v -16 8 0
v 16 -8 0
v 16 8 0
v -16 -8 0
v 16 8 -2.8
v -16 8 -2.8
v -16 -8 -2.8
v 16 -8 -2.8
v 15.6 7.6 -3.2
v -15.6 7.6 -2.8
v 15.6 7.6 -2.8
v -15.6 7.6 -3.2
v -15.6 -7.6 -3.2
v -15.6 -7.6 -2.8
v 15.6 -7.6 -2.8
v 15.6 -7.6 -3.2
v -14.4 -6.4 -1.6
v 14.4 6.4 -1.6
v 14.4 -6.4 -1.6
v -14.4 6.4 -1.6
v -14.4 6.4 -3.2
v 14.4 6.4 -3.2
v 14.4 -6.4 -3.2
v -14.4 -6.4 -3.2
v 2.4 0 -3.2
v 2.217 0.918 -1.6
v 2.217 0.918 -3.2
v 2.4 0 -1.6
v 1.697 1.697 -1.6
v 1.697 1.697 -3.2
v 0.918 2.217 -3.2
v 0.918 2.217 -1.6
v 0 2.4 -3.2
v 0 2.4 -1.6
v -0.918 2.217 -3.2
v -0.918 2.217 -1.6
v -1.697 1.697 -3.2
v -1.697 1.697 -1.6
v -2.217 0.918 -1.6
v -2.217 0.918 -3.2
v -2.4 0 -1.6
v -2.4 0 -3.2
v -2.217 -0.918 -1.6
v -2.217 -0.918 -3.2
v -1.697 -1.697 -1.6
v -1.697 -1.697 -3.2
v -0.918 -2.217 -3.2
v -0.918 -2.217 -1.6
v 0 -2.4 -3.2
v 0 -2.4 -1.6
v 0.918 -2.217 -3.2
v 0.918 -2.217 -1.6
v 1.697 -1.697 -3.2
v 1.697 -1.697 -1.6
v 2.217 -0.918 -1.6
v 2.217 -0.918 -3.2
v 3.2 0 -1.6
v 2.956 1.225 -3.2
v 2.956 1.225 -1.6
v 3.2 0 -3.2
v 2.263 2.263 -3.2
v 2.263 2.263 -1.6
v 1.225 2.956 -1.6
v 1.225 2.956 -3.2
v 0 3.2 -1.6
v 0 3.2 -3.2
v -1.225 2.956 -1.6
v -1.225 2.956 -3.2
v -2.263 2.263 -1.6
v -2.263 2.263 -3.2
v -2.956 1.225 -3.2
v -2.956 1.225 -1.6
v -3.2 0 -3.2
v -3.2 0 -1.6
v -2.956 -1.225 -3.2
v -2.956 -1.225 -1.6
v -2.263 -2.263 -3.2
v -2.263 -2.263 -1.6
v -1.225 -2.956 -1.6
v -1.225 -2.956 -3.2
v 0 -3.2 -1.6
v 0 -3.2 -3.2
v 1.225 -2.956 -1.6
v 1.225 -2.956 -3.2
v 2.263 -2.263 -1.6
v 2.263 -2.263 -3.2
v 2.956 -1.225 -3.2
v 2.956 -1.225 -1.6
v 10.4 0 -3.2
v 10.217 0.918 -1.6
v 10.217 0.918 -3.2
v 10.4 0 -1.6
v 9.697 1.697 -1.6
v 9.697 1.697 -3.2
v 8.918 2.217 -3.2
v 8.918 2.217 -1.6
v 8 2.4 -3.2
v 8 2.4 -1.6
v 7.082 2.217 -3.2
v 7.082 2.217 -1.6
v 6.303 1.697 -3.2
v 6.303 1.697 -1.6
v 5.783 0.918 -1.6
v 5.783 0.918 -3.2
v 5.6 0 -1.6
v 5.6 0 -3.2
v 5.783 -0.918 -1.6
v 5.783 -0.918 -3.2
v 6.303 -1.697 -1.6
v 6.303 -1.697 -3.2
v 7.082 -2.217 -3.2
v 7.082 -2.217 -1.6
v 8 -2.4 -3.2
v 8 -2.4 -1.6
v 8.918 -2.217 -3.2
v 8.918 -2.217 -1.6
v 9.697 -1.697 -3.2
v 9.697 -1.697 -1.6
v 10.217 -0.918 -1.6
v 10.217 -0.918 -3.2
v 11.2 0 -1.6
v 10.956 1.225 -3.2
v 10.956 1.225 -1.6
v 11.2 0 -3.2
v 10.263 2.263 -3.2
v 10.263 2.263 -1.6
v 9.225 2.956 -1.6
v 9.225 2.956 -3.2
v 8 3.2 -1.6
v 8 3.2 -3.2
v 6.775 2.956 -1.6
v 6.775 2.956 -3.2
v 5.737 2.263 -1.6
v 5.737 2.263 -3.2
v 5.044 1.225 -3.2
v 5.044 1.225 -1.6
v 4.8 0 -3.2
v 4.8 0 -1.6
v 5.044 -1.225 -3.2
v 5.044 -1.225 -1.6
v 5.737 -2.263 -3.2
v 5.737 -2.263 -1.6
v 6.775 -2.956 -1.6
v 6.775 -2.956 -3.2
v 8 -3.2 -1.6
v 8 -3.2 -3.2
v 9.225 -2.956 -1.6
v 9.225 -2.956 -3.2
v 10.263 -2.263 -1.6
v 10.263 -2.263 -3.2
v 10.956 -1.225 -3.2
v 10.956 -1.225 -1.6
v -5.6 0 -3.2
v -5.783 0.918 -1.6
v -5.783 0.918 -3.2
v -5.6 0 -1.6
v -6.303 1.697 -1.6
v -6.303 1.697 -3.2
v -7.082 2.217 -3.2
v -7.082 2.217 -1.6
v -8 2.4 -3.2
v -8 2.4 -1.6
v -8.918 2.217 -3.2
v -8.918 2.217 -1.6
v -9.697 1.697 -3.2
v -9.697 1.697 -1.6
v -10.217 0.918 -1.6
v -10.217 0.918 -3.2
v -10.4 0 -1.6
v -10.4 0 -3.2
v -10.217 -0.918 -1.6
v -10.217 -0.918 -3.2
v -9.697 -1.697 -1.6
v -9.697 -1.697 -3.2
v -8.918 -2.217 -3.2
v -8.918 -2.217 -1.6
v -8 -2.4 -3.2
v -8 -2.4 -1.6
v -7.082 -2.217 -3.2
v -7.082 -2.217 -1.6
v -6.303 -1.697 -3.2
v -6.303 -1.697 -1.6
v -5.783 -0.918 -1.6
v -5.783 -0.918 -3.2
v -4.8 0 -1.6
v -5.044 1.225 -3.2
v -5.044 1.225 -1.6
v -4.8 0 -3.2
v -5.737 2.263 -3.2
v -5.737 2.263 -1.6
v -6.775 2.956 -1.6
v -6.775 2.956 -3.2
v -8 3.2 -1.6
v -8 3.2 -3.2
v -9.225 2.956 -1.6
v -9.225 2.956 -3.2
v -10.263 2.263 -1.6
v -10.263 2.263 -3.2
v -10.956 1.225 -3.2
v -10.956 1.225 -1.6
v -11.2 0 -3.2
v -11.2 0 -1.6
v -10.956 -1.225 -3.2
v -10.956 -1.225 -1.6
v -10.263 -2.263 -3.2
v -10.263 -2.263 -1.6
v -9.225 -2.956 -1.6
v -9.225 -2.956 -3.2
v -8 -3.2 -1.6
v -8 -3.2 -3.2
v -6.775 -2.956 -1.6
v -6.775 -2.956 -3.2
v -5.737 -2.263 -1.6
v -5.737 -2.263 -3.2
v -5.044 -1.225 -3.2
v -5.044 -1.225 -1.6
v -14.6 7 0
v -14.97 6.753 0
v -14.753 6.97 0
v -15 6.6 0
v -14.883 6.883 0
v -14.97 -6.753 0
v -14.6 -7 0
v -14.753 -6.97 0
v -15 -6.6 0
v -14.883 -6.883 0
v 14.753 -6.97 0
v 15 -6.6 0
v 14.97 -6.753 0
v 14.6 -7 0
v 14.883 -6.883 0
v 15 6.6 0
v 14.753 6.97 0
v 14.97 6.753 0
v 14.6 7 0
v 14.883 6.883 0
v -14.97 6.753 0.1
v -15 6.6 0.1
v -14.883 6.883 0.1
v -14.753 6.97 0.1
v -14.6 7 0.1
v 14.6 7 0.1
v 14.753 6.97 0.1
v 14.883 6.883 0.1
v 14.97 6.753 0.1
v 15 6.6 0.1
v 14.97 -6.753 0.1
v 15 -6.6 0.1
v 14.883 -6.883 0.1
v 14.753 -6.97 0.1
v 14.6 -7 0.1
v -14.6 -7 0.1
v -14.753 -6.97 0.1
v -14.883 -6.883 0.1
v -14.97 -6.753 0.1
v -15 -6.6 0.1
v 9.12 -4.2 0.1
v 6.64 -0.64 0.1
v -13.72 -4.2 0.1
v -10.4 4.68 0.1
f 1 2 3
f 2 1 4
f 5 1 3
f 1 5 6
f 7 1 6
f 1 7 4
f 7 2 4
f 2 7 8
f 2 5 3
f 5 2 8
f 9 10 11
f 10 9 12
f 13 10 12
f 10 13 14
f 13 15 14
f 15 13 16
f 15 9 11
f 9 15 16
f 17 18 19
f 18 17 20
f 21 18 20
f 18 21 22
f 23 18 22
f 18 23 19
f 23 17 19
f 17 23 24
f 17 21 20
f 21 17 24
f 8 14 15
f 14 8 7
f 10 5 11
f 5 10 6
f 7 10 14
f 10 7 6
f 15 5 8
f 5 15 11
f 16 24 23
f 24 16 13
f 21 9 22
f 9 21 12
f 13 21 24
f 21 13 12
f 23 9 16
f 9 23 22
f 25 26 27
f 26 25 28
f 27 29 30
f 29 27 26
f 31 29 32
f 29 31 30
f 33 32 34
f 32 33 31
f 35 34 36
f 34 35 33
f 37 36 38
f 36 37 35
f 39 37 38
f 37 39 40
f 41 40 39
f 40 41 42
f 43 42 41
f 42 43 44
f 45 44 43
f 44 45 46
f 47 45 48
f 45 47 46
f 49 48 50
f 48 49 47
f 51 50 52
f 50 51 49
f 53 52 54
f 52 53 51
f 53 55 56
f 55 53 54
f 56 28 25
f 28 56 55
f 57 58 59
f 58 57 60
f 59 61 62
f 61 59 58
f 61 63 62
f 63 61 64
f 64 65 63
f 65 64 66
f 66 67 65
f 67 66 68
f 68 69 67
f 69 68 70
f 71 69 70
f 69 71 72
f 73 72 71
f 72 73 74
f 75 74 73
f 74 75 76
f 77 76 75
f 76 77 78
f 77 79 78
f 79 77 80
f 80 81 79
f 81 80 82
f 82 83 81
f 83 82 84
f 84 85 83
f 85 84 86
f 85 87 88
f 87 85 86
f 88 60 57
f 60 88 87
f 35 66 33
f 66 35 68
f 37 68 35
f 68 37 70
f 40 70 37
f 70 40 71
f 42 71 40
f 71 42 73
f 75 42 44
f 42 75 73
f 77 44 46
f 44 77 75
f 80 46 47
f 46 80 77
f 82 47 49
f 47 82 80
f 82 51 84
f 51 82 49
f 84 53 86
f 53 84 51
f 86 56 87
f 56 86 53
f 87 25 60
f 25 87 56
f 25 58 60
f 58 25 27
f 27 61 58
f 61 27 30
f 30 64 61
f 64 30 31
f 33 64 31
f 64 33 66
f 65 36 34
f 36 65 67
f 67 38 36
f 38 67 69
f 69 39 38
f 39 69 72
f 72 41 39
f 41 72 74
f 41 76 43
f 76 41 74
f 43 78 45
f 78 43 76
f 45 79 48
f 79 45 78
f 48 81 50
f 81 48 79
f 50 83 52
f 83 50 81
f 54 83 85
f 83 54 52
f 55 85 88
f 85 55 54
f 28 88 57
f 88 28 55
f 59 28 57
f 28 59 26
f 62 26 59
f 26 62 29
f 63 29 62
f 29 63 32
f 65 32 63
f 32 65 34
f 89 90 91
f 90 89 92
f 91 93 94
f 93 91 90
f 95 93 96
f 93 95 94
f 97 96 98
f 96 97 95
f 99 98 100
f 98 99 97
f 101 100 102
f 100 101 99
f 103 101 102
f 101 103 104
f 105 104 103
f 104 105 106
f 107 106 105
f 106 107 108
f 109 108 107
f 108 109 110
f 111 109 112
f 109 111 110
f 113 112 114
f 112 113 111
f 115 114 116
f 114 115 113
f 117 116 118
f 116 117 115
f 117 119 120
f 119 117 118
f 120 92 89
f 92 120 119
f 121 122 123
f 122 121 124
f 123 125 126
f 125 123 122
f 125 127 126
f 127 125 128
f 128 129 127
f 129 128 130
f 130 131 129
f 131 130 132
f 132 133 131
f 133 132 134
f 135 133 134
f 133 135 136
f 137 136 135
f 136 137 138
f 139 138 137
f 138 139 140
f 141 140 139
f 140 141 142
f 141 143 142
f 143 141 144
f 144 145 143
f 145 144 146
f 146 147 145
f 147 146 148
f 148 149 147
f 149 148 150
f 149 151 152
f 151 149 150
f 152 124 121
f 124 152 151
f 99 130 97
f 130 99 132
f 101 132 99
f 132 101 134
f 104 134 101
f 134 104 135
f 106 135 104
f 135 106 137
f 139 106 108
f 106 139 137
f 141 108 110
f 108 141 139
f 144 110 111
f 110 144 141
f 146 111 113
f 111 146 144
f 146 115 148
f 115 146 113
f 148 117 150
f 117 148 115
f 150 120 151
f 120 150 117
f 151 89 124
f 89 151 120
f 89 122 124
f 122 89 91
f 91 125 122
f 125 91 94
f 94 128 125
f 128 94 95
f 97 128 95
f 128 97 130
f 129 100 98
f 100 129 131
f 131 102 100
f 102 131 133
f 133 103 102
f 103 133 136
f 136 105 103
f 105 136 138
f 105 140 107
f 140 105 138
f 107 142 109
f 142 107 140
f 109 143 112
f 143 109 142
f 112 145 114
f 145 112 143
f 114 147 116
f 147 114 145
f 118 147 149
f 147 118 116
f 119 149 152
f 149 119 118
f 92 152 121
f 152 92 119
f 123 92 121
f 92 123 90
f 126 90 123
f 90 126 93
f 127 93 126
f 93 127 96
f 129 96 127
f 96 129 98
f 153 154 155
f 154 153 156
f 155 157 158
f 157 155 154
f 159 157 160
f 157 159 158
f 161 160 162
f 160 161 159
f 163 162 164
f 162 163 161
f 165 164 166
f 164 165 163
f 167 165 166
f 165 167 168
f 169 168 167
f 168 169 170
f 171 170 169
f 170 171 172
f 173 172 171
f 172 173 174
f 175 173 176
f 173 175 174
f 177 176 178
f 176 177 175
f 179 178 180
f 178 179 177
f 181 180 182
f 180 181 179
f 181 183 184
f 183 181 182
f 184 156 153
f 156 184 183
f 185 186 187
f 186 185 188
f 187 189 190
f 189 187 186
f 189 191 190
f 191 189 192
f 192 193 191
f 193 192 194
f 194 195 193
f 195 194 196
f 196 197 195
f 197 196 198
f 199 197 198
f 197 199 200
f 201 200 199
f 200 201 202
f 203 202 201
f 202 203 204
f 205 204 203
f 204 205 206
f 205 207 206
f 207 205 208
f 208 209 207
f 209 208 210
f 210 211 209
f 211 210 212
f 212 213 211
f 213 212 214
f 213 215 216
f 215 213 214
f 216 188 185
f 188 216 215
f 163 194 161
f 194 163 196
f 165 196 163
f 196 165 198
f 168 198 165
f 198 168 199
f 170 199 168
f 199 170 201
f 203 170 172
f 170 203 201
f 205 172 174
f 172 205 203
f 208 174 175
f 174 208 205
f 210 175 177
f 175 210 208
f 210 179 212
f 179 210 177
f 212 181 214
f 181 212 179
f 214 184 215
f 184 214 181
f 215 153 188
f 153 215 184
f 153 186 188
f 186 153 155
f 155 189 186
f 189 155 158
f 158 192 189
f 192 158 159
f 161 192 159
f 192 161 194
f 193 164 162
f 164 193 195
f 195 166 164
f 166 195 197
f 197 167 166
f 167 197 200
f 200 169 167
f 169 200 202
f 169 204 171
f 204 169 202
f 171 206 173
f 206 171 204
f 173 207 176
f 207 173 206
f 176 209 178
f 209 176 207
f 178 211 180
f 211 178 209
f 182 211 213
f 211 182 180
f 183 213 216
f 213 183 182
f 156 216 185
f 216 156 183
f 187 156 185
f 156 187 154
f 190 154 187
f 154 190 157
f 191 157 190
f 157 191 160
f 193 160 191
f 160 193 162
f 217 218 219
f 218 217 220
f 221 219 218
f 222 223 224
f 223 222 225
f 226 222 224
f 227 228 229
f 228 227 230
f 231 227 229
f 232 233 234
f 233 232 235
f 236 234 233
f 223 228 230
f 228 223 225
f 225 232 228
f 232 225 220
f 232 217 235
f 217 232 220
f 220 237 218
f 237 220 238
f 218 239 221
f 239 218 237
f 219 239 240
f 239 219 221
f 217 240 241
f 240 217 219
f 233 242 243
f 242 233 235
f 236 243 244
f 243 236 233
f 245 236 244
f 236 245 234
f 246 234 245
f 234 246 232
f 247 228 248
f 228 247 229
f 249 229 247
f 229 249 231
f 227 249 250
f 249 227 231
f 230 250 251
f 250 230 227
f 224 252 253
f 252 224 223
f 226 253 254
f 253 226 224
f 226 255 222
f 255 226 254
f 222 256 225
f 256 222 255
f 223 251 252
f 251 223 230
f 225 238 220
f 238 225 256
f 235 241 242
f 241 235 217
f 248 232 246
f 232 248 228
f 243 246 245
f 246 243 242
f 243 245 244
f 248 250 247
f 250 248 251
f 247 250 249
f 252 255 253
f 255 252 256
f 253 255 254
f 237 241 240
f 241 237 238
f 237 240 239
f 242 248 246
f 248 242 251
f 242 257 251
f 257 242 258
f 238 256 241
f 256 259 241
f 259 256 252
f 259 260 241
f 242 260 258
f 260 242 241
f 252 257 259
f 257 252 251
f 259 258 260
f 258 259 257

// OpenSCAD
// file: ../p/4-4ring3.scad
use <../lib.scad>
$fa=1; $fs=0.2;
function ldraw_lib__4_4ring3(realsolid=false) = [
// 0 Ring  3 x 1.0
// 0 Name: 4-4ring3.dat
// 0 Author: James Jessiman
// 0 !LDRAW_ORG Primitive UPDATE 2009-01
// 0 !LICENSE Licensed under CC BY 2.0 and CC BY 4.0 : see CAreadme.txt
// 
// 0 BFC CERTIFY CCW
  [0,"BFC","CERTIFY"],
  [0,"BFC","CCW"],
// 
// 0 !HISTORY 1998-12-15 [PTadmin] Official Update 1998-10
// 0 !HISTORY 2002-04-05 [hafhead] Added BFC statement
// 0 !HISTORY 2002-04-25 [PTadmin] Official Update 2002-02
// 0 !HISTORY 2007-06-24 [PTadmin] Header formatted for Contributor Agreement
// 0 !HISTORY 2008-07-01 [PTadmin] Official Update 2008-01
// 0 !HISTORY 2008-08-26 [cwdee] Switch polygon winding and rename
// 0 !HISTORY 2009-05-02 [PTadmin] Official Update 2009-01
// 
// 
// 4 16 -1.5308 0 3.6956 -1.1481 0 2.7717 0 0 3 0 0 4
  [4,16,-1.5308,0,3.6956,-1.1481,0,2.7717,0,0,3,0,0,4],
// 4 16 -2.8284 0 2.8284 -2.1213 0 2.1213 -1.1481 0 2.7717 -1.5308 0 3.6956
  [4,16,-2.8284,0,2.8284,-2.1213,0,2.1213,-1.1481,0,2.7717,-1.5308,0,3.6956],
// 4 16 -3.6956 0 1.5308 -2.7717 0 1.1481 -2.1213 0 2.1213 -2.8284 0 2.8284
  [4,16,-3.6956,0,1.5308,-2.7717,0,1.1481,-2.1213,0,2.1213,-2.8284,0,2.8284],
// 4 16 -4 0 0 -3 0 0 -2.7717 0 1.1481 -3.6956 0 1.5308
  [4,16,-4,0,0,-3,0,0,-2.7717,0,1.1481,-3.6956,0,1.5308],
// 4 16 -3.6956 0 -1.5308 -2.7717 0 -1.1481 -3 0 0 -4 0 0
  [4,16,-3.6956,0,-1.5308,-2.7717,0,-1.1481,-3,0,0,-4,0,0],
// 4 16 -2.8284 0 -2.8284 -2.1213 0 -2.1213 -2.7717 0 -1.1481 -3.6956 0 -1.5308
  [4,16,-2.8284,0,-2.8284,-2.1213,0,-2.1213,-2.7717,0,-1.1481,-3.6956,0,-1.5308],
// 4 16 -1.5308 0 -3.6956 -1.1481 0 -2.7717 -2.1213 0 -2.1213 -2.8284 0 -2.8284
  [4,16,-1.5308,0,-3.6956,-1.1481,0,-2.7717,-2.1213,0,-2.1213,-2.8284,0,-2.8284],
// 4 16 0 0 -4 0 0 -3 -1.1481 0 -2.7717 -1.5308 0 -3.6956
  [4,16,0,0,-4,0,0,-3,-1.1481,0,-2.7717,-1.5308,0,-3.6956],
// 4 16 1.5308 0 -3.6956 1.1481 0 -2.7717 0 0 -3 0 0 -4
  [4,16,1.5308,0,-3.6956,1.1481,0,-2.7717,0,0,-3,0,0,-4],
// 4 16 2.8284 0 -2.8284 2.1213 0 -2.1213 1.1481 0 -2.7717 1.5308 0 -3.6956
  [4,16,2.8284,0,-2.8284,2.1213,0,-2.1213,1.1481,0,-2.7717,1.5308,0,-3.6956],
// 4 16 3.6956 0 -1.5308 2.7717 0 -1.1481 2.1213 0 -2.1213 2.8284 0 -2.8284
  [4,16,3.6956,0,-1.5308,2.7717,0,-1.1481,2.1213,0,-2.1213,2.8284,0,-2.8284],
// 4 16 4 0 0 3 0 0 2.7717 0 -1.1481 3.6956 0 -1.5308
  [4,16,4,0,0,3,0,0,2.7717,0,-1.1481,3.6956,0,-1.5308],
// 4 16 3.6956 0 1.5308 2.7717 0 1.1481 3 0 0 4 0 0
  [4,16,3.6956,0,1.5308,2.7717,0,1.1481,3,0,0,4,0,0],
// 4 16 2.8284 0 2.8284 2.1213 0 2.1213 2.7717 0 1.1481 3.6956 0 1.5308
  [4,16,2.8284,0,2.8284,2.1213,0,2.1213,2.7717,0,1.1481,3.6956,0,1.5308],
// 4 16 1.5308 0 3.6956 1.1481 0 2.7717 2.1213 0 2.1213 2.8284 0 2.8284
  [4,16,1.5308,0,3.6956,1.1481,0,2.7717,2.1213,0,2.1213,2.8284,0,2.8284],
// 4 16 0 0 4 0 0 3 1.1481 0 2.7717 1.5308 0 3.6956
  [4,16,0,0,4,0,0,3,1.1481,0,2.7717,1.5308,0,3.6956],
// 0
];
module ldraw_lib__4_4ring3(step=0, col=false, unit=2/5, alt=false, line=0.2, solid=!$preview)
    makepoly(ldraw_lib__4_4ring3(solid), step=step, col=col, unit=unit, alt=alt, line=line, solid=solid);
ldraw_lib__4_4ring3(line=0.2);
// file: ../p/4-4edge.scad
use <../lib.scad>
function ldraw_lib__4_4edge() = [
// 0 Circle 1.0
// 0 Name: 4-4edge.dat
// 0 Author: James Jessiman
// 0 !LDRAW_ORG Primitive UPDATE 2017-01
// 0 !LICENSE Licensed under CC BY 2.0 and CC BY 4.0 : see CAreadme.txt
// 
// 0 BFC CERTIFY CCW
  [0,"BFC","CERTIFY"],
  [0,"BFC","CCW"],
// 
// 0 !HISTORY 1998-12-15 [PTadmin] Official Update 1998-10
// 0 !HISTORY 2005-12-28 [PTadmin] Official Update 2005-01
// 0 !HISTORY 2007-06-24 [PTadmin] Header formatted for Contributor Agreement
// 0 !HISTORY 2008-07-01 [PTadmin] Official Update 2008-01
// 0 !HISTORY 2017-01-15 [Steffen] BFCed
// 0 !HISTORY 2017-12-30 [PTadmin] Official Update 2017-01
// 
// 
// 2 24 1 0 0 0.9239 0 0.3827
  [2,24,1,0,0,0.9239,0,0.3827],
// 2 24 0.9239 0 0.3827 0.7071 0 0.7071
  [2,24,0.9239,0,0.3827,0.7071,0,0.7071],
// 2 24 0.7071 0 0.7071 0.3827 0 0.9239
  [2,24,0.7071,0,0.7071,0.3827,0,0.9239],
// 2 24 0.3827 0 0.9239 0 0 1
  [2,24,0.3827,0,0.9239,0,0,1],
// 2 24 0 0 1 -0.3827 0 0.9239
  [2,24,0,0,1,-0.3827,0,0.9239],
// 2 24 -0.3827 0 0.9239 -0.7071 0 0.7071
  [2,24,-0.3827,0,0.9239,-0.7071,0,0.7071],
// 2 24 -0.7071 0 0.7071 -0.9239 0 0.3827
  [2,24,-0.7071,0,0.7071,-0.9239,0,0.3827],
// 2 24 -0.9239 0 0.3827 -1 0 -0
  [2,24,-0.9239,0,0.3827,-1,0,-0],
// 2 24 -1 0 -0 -0.9239 0 -0.3827
  [2,24,-1,0,-0,-0.9239,0,-0.3827],
// 2 24 -0.9239 0 -0.3827 -0.7071 0 -0.7071
  [2,24,-0.9239,0,-0.3827,-0.7071,0,-0.7071],
// 2 24 -0.7071 0 -0.7071 -0.3827 0 -0.9239
  [2,24,-0.7071,0,-0.7071,-0.3827,0,-0.9239],
// 2 24 -0.3827 0 -0.9239 0 0 -1
  [2,24,-0.3827,0,-0.9239,0,0,-1],
// 2 24 0 0 -1 0.3827 0 -0.9239
  [2,24,0,0,-1,0.3827,0,-0.9239],
// 2 24 0.3827 0 -0.9239 0.7071 0 -0.7071
  [2,24,0.3827,0,-0.9239,0.7071,0,-0.7071],
// 2 24 0.7071 0 -0.7071 0.9239 0 -0.3827
  [2,24,0.7071,0,-0.7071,0.9239,0,-0.3827],
// 2 24 0.9239 0 -0.3827 1 0 0
  [2,24,0.9239,0,-0.3827,1,0,0],
];
module ldraw_lib__4_4edge(step=0, col=false, unit=2/5, alt=false, line=0.2, solid=!$preview)
    makepoly(ldraw_lib__4_4edge(), step=step, col=col, unit=unit, alt=alt, line=line, solid=solid);
ldraw_lib__4_4edge(line=0.2);
// file: ../p/4-4cyli.scad
use <../lib.scad>
$fa=1; $fs=0.2;
function ldraw_lib__4_4cyli(realsolid=false) = [
// 0 Cylinder 1.0
// 0 Name: 4-4cyli.dat
// 0 Author: James Jessiman
// 0 !LDRAW_ORG Primitive UPDATE 2005-01
// 0 !LICENSE Licensed under CC BY 2.0 and CC BY 4.0 : see CAreadme.txt
// 
// 0 BFC CERTIFY CCW
  [0,"BFC","CERTIFY"],
  [0,"BFC","CCW"],
// 
// 0 !HISTORY 1998-12-15 [PTadmin] Official Update 1998-10
// 0 !HISTORY 2002-03-23 [sbliss] Added BFC statement; merged headers from files in distributions LDraw 0.27 and Complete.
// 0 !HISTORY 2002-04-25 [PTadmin] Official Update 2002-02
// 0 !HISTORY 2004-12-14 [guyvivan] BFC CCW
// 0 !HISTORY 2005-12-28 [PTadmin] Official Update 2005-01
// 0 !HISTORY 2007-06-24 [PTadmin] Header formatted for Contributor Agreement
// 0 !HISTORY 2008-07-01 [PTadmin] Official Update 2008-01
// 
// 
// 4 16 1 1 0 0.9239 1 0.3827 0.9239 0 0.3827 1 0 0
  [4,16,1,1,0,0.9239,1,0.3827,0.9239,0,0.3827,1,0,0],
// 5 24 1 0 0 1 1 0 0.9239 0 0.3827 0.9239 0 -0.3827
  [5,24,1,0,0,1,1,0,0.9239,0,0.3827,0.9239,0,-0.3827],
// 4 16 0.9239 1 0.3827 0.7071 1 0.7071 0.7071 0 0.7071 0.9239 0 0.3827
  [4,16,0.9239,1,0.3827,0.7071,1,0.7071,0.7071,0,0.7071,0.9239,0,0.3827],
// 5 24 0.9239 0 0.3827 0.9239 1 0.3827 0.7071 0 0.7071 1 0 0
  [5,24,0.9239,0,0.3827,0.9239,1,0.3827,0.7071,0,0.7071,1,0,0],
// 4 16 0.7071 1 0.7071 0.3827 1 0.9239 0.3827 0 0.9239 0.7071 0 0.7071
  [4,16,0.7071,1,0.7071,0.3827,1,0.9239,0.3827,0,0.9239,0.7071,0,0.7071],
// 5 24 0.7071 0 0.7071 0.7071 1 0.7071 0.3827 0 0.9239 0.9239 0 0.3827
  [5,24,0.7071,0,0.7071,0.7071,1,0.7071,0.3827,0,0.9239,0.9239,0,0.3827],
// 4 16 0.3827 1 0.9239 0 1 1 0 0 1 0.3827 0 0.9239
  [4,16,0.3827,1,0.9239,0,1,1,0,0,1,0.3827,0,0.9239],
// 5 24 0.3827 0 0.9239 0.3827 1 0.9239 0 0 1 0.7071 0 0.7071
  [5,24,0.3827,0,0.9239,0.3827,1,0.9239,0,0,1,0.7071,0,0.7071],
// 4 16 0 1 1 -0.3827 1 0.9239 -0.3827 0 0.9239 0 0 1
  [4,16,0,1,1,-0.3827,1,0.9239,-0.3827,0,0.9239,0,0,1],
// 5 24 0 0 1 0 1 1 -0.3827 0 0.9239 0.3827 0 0.9239
  [5,24,0,0,1,0,1,1,-0.3827,0,0.9239,0.3827,0,0.9239],
// 4 16 -0.3827 1 0.9239 -0.7071 1 0.7071 -0.7071 0 0.7071 -0.3827 0 0.9239
  [4,16,-0.3827,1,0.9239,-0.7071,1,0.7071,-0.7071,0,0.7071,-0.3827,0,0.9239],
// 5 24 -0.3827 0 0.9239 -0.3827 1 0.9239 -0.7071 0 0.7071 0 0 1
  [5,24,-0.3827,0,0.9239,-0.3827,1,0.9239,-0.7071,0,0.7071,0,0,1],
// 4 16 -0.7071 1 0.7071 -0.9239 1 0.3827 -0.9239 0 0.3827 -0.7071 0 0.7071
  [4,16,-0.7071,1,0.7071,-0.9239,1,0.3827,-0.9239,0,0.3827,-0.7071,0,0.7071],
// 5 24 -0.7071 0 0.7071 -0.7071 1 0.7071 -0.9239 0 0.3827 -0.3827 0 0.9239
  [5,24,-0.7071,0,0.7071,-0.7071,1,0.7071,-0.9239,0,0.3827,-0.3827,0,0.9239],
// 4 16 -0.9239 1 0.3827 -1 1 0 -1 0 0 -0.9239 0 0.3827
  [4,16,-0.9239,1,0.3827,-1,1,0,-1,0,0,-0.9239,0,0.3827],
// 5 24 -0.9239 0 0.3827 -0.9239 1 0.3827 -1 0 0 -0.7071 0 0.7071
  [5,24,-0.9239,0,0.3827,-0.9239,1,0.3827,-1,0,0,-0.7071,0,0.7071],
// 4 16 -1 1 0 -0.9239 1 -0.3827 -0.9239 0 -0.3827 -1 0 0
  [4,16,-1,1,0,-0.9239,1,-0.3827,-0.9239,0,-0.3827,-1,0,0],
// 5 24 -1 0 0 -1 1 0 -0.9239 0 -0.3827 -0.9239 0 0.3827
  [5,24,-1,0,0,-1,1,0,-0.9239,0,-0.3827,-0.9239,0,0.3827],
// 4 16 -0.9239 1 -0.3827 -0.7071 1 -0.7071 -0.7071 0 -0.7071 -0.9239 0 -0.3827
  [4,16,-0.9239,1,-0.3827,-0.7071,1,-0.7071,-0.7071,0,-0.7071,-0.9239,0,-0.3827],
// 5 24 -0.9239 0 -0.3827 -0.9239 1 -0.3827 -0.7071 0 -0.7071 -1 0 0
  [5,24,-0.9239,0,-0.3827,-0.9239,1,-0.3827,-0.7071,0,-0.7071,-1,0,0],
// 4 16 -0.7071 1 -0.7071 -0.3827 1 -0.9239 -0.3827 0 -0.9239 -0.7071 0 -0.7071
  [4,16,-0.7071,1,-0.7071,-0.3827,1,-0.9239,-0.3827,0,-0.9239,-0.7071,0,-0.7071],
// 5 24 -0.7071 0 -0.7071 -0.7071 1 -0.7071 -0.3827 0 -0.9239 -0.9239 0 -0.3827
  [5,24,-0.7071,0,-0.7071,-0.7071,1,-0.7071,-0.3827,0,-0.9239,-0.9239,0,-0.3827],
// 4 16 -0.3827 1 -0.9239 0 1 -1 0 0 -1 -0.3827 0 -0.9239
  [4,16,-0.3827,1,-0.9239,0,1,-1,0,0,-1,-0.3827,0,-0.9239],
// 5 24 -0.3827 0 -0.9239 -0.3827 1 -0.9239 0 0 -1 -0.7071 0 -0.7071
  [5,24,-0.3827,0,-0.9239,-0.3827,1,-0.9239,0,0,-1,-0.7071,0,-0.7071],
// 4 16 0 1 -1 0.3827 1 -0.9239 0.3827 0 -0.9239 0 0 -1
  [4,16,0,1,-1,0.3827,1,-0.9239,0.3827,0,-0.9239,0,0,-1],
// 5 24 0 0 -1 0 1 -1 0.3827 0 -0.9239 -0.3827 0 -0.9239
  [5,24,0,0,-1,0,1,-1,0.3827,0,-0.9239,-0.3827,0,-0.9239],
// 4 16 0.3827 1 -0.9239 0.7071 1 -0.7071 0.7071 0 -0.7071 0.3827 0 -0.9239
  [4,16,0.3827,1,-0.9239,0.7071,1,-0.7071,0.7071,0,-0.7071,0.3827,0,-0.9239],
// 5 24 0.3827 0 -0.9239 0.3827 1 -0.9239 0.7071 0 -0.7071 0 0 -1
  [5,24,0.3827,0,-0.9239,0.3827,1,-0.9239,0.7071,0,-0.7071,0,0,-1],
// 4 16 0.7071 1 -0.7071 0.9239 1 -0.3827 0.9239 0 -0.3827 0.7071 0 -0.7071
  [4,16,0.7071,1,-0.7071,0.9239,1,-0.3827,0.9239,0,-0.3827,0.7071,0,-0.7071],
// 5 24 0.7071 0 -0.7071 0.7071 1 -0.7071 0.9239 0 -0.3827 0.3827 0 -0.9239
  [5,24,0.7071,0,-0.7071,0.7071,1,-0.7071,0.9239,0,-0.3827,0.3827,0,-0.9239],
// 4 16 0.9239 1 -0.3827 1 1 0 1 0 0 0.9239 0 -0.3827
  [4,16,0.9239,1,-0.3827,1,1,0,1,0,0,0.9239,0,-0.3827],
// 5 24 0.9239 0 -0.3827 0.9239 1 -0.3827 1 0 0 0.7071 0 -0.7071
  [5,24,0.9239,0,-0.3827,0.9239,1,-0.3827,1,0,0,0.7071,0,-0.7071],
// 0
];
module ldraw_lib__4_4cyli(step=0, col=false, unit=2/5, alt=false, line=0.2, solid=!$preview)
    makepoly(ldraw_lib__4_4cyli(solid), step=step, col=col, unit=unit, alt=alt, line=line, solid=solid);
ldraw_lib__4_4cyli(line=0.2);
// file: ../p/stud4.scad
use <../lib.scad>
use <4-4cyli.scad>
use <4-4edge.scad>
use <4-4ring3.scad>
function ldraw_lib__stud4() = [
// 0 Stud Tube Open
// 0 Name: stud4.dat
// 0 Author: James Jessiman
// 0 !LDRAW_ORG Primitive UPDATE 2009-02
// 0 !LICENSE Licensed under CC BY 4.0 : see CAreadme.txt
// 
// 0 BFC CERTIFY CCW
  [0,"BFC","CERTIFY"],
  [0,"BFC","CCW"],
// 
// 0 !HISTORY 1999-07-05 [PTadmin] Official Update 1999-05
// 0 !HISTORY 2002-04-04 [sbliss] Modified for BFC compliance
// 0 !HISTORY 2002-04-25 [PTadmin] Official Update 2002-02
// 0 !HISTORY 2007-06-24 [PTadmin] Header formatted for Contributor Agreement
// 0 !HISTORY 2008-07-01 [PTadmin] Official Update 2008-01
// 0 !HISTORY 2009-06-21 [cwdee] Update ring references to 4-4ring
// 0 !HISTORY 2009-09-03 [PTadmin] Official Update 2009-02
// 
// 
// 1 16 0 -4 0 6 0 0 0 1 0 0 0 6 4-4edge.dat
  [1,16,0,-4,0,6,0,0,0,1,0,0,0,6, ldraw_lib__4_4edge()],
// 1 16 0 -4 0 8 0 0 0 1 0 0 0 8 4-4edge.dat
  [1,16,0,-4,0,8,0,0,0,1,0,0,0,8, ldraw_lib__4_4edge()],
// 1 16 0 0 0 6 0 0 0 1 0 0 0 6 4-4edge.dat
  [1,16,0,0,0,6,0,0,0,1,0,0,0,6, ldraw_lib__4_4edge()],
// 1 16 0 0 0 8 0 0 0 1 0 0 0 8 4-4edge.dat
  [1,16,0,0,0,8,0,0,0,1,0,0,0,8, ldraw_lib__4_4edge()],
// 0 BFC INVERTNEXT
  [0,"BFC","INVERTNEXT"],
// 1 16 0 -4 0 6 0 0 0 4 0 0 0 6 4-4cyli.dat
  [1,16,0,-4,0,6,0,0,0,4,0,0,0,6, ldraw_lib__4_4cyli()],
// 1 16 0 -4 0 8 0 0 0 4 0 0 0 8 4-4cyli.dat
  [1,16,0,-4,0,8,0,0,0,4,0,0,0,8, ldraw_lib__4_4cyli()],
// 1 16 0 -4 0 2 0 0 0 1 0 0 0 2 4-4ring3.dat
  [1,16,0,-4,0,2,0,0,0,1,0,0,0,2, ldraw_lib__4_4ring3()],
  [-1,16,0,0,0,2,0,0,0,-1,0,0,0,2, ldraw_lib__4_4ring3()],
// 0
];
module ldraw_lib__stud4(step=0, col=false, unit=2/5, alt=false, line=0.2, solid=!$preview)
    makepoly(ldraw_lib__stud4(), step=step, col=col, unit=unit, alt=alt, line=line, solid=solid);
ldraw_lib__stud4(line=0.2);
// file: ../p/box5.scad
use <../lib.scad>
function ldraw_lib__box5() = [
// 0 Box with 5 Faces and All Edges
// 0 Name: box5.dat
// 0 Author: James Jessiman
// 0 !LDRAW_ORG Primitive UPDATE 2012-01
// 0 !LICENSE Licensed under CC BY 2.0 and CC BY 4.0 : see CAreadme.txt
// 
// 0 BFC CERTIFY CCW
  [0,"BFC","CERTIFY"],
  [0,"BFC","CCW"],
// 
// 0 !HISTORY 2002-04-03 [sbliss] Modified for BFC compliance
// 0 !HISTORY 2002-04-25 [PTadmin] Official Update 2002-02
// 0 !HISTORY 2007-06-24 [PTadmin] Header formatted for Contributor Agreement
// 0 !HISTORY 2008-07-01 [PTadmin] Official Update 2008-01
// 0 !HISTORY 2012-02-16 [Philo] Changed to CCW
// 0 !HISTORY 2012-03-30 [PTadmin] Official Update 2012-01
// 
// 
// 2 24 1 1 1 -1 1 1
  [2,24,1,1,1,-1,1,1],
// 2 24 -1 1 1 -1 1 -1
  [2,24,-1,1,1,-1,1,-1],
// 2 24 -1 1 -1 1 1 -1
  [2,24,-1,1,-1,1,1,-1],
// 2 24 1 1 -1 1 1 1
  [2,24,1,1,-1,1,1,1],
// 2 24 1 0 1 -1 0 1
  [2,24,1,0,1,-1,0,1],
// 2 24 -1 0 1 -1 0 -1
  [2,24,-1,0,1,-1,0,-1],
// 2 24 -1 0 -1 1 0 -1
  [2,24,-1,0,-1,1,0,-1],
// 2 24 1 0 -1 1 0 1
  [2,24,1,0,-1,1,0,1],
// 2 24 1 0 1 1 1 1
  [2,24,1,0,1,1,1,1],
// 2 24 -1 0 1 -1 1 1
  [2,24,-1,0,1,-1,1,1],
// 2 24 1 0 -1 1 1 -1
  [2,24,1,0,-1,1,1,-1],
// 2 24 -1 0 -1 -1 1 -1
  [2,24,-1,0,-1,-1,1,-1],
// 4 16 -1 1 1 1 1 1 1 1 -1 -1 1 -1
  [4,16,-1,1,1,1,1,1,1,1,-1,-1,1,-1],
// 4 16 -1 1 1 -1 0 1 1 0 1 1 1 1
  [4,16,-1,1,1,-1,0,1,1,0,1,1,1,1],
// 4 16 -1 1 -1 -1 0 -1 -1 0 1 -1 1 1
  [4,16,-1,1,-1,-1,0,-1,-1,0,1,-1,1,1],
// 4 16 1 1 -1 1 0 -1 -1 0 -1 -1 1 -1
  [4,16,1,1,-1,1,0,-1,-1,0,-1,-1,1,-1],
// 4 16 1 1 1 1 0 1 1 0 -1 1 1 -1
  [4,16,1,1,1,1,0,1,1,0,-1,1,1,-1],
];
makepoly(ldraw_lib__box5(), line=0.2);
// file: ../p/box4.scad
use <../lib.scad>
function ldraw_lib__box4() = [
// 0 Box with 4 Faces (2 Parallel Pairs) and All Edges
// 0 Name: box4.dat
// 0 Author: James Jessiman
// 0 !LDRAW_ORG Primitive UPDATE 2012-01
// 0 !LICENSE Licensed under CC BY 4.0 : see CAreadme.txt
// 
// 0 BFC CERTIFY CCW
  [0,"BFC","CERTIFY"],
  [0,"BFC","CCW"],
// 
// 0 !HISTORY 2002-04-03 [sbliss] Modified for BFC compliance
// 0 !HISTORY 2002-04-25 [PTadmin] Official Update 2002-02
// 0 !HISTORY 2007-06-24 [PTadmin] Header formatted for Contributor Agreement
// 0 !HISTORY 2008-07-01 [PTadmin] Official Update 2008-01
// 0 !HISTORY 2012-02-16 [Philo] Changed to CCW
// 0 !HISTORY 2012-03-30 [PTadmin] Official Update 2012-01
// 
// 
// 2 24 1 1 1 -1 1 1
  [2,24,1,1,1,-1,1,1],
// 2 24 -1 1 1 -1 1 -1
  [2,24,-1,1,1,-1,1,-1],
// 2 24 -1 1 -1 1 1 -1
  [2,24,-1,1,-1,1,1,-1],
// 2 24 1 1 -1 1 1 1
  [2,24,1,1,-1,1,1,1],
// 2 24 1 0 1 -1 0 1
  [2,24,1,0,1,-1,0,1],
// 2 24 -1 0 1 -1 0 -1
  [2,24,-1,0,1,-1,0,-1],
// 2 24 -1 0 -1 1 0 -1
  [2,24,-1,0,-1,1,0,-1],
// 2 24 1 0 -1 1 0 1
  [2,24,1,0,-1,1,0,1],
// 2 24 1 0 1 1 1 1
  [2,24,1,0,1,1,1,1],
// 2 24 -1 0 1 -1 1 1
  [2,24,-1,0,1,-1,1,1],
// 2 24 1 0 -1 1 1 -1
  [2,24,1,0,-1,1,1,-1],
// 2 24 -1 0 -1 -1 1 -1
  [2,24,-1,0,-1,-1,1,-1],
// 4 16 -1 1 1 -1 0 1 1 0 1 1 1 1
  [4,16,-1,1,1,-1,0,1,1,0,1,1,1,1],
// 4 16 -1 1 -1 -1 0 -1 -1 0 1 -1 1 1
  [4,16,-1,1,-1,-1,0,-1,-1,0,1,-1,1,1],
// 4 16 1 1 -1 1 0 -1 -1 0 -1 -1 1 -1
  [4,16,1,1,-1,1,0,-1,-1,0,-1,-1,1,-1],
// 4 16 1 1 1 1 0 1 1 0 -1 1 1 -1
  [4,16,1,1,1,1,0,1,1,0,-1,1,1,-1],
];
module ldraw_lib__box4(step=0, col=false, unit=2/5, alt=false, line=0.2, solid=!$preview)
    makepoly(ldraw_lib__box4(), step=step, col=col, unit=unit, alt=alt, line=line, solid=solid);
ldraw_lib__box4(line=0.2);
// file: ../p/1-4cyli.scad
use <../lib.scad>
function ldraw_lib__1_4cyli() = [
// 0 Cylinder 0.25
// 0 Name: 1-4cyli.dat
// 0 Author: James Jessiman
// 0 !LDRAW_ORG Primitive UPDATE 2012-01
// 0 !LICENSE Licensed under CC BY 2.0 and CC BY 4.0 : see CAreadme.txt
// 
// 0 BFC CERTIFY CCW
  [0,"BFC","CERTIFY"],
  [0,"BFC","CCW"],
// 
// 0 !HISTORY 2002-03-23 [sbliss] Added BFC statement.
// 0 !HISTORY 2002-04-25 [PTadmin] Official Update 2002-02
// 0 !HISTORY 2007-06-22 [PTadmin] Header formatted for Contributor Agreement
// 0 !HISTORY 2008-07-01 [PTadmin] Official Update 2008-01
// 0 !HISTORY 2012-02-16 [Philo] Changed to CCW
// 0 !HISTORY 2012-03-30 [PTadmin] Official Update 2012-01
// 
// 
// 4 16 1 1 0 0.9239 1 0.3827 0.9239 0 0.3827 1 0 0
  [4,16,1,1,0,0.9239,1,0.3827,0.9239,0,0.3827,1,0,0],
// 5 24 1 0 0 1 1 0 0.9239 0 0.3827 1 0 -1
  [5,24,1,0,0,1,1,0,0.9239,0,0.3827,1,0,-1],
// 4 16 0.9239 1 0.3827 0.7071 1 0.7071 0.7071 0 0.7071 0.9239 0 0.3827
  [4,16,0.9239,1,0.3827,0.7071,1,0.7071,0.7071,0,0.7071,0.9239,0,0.3827],
// 5 24 0.9239 0 0.3827 0.9239 1 0.3827 0.7071 0 0.7071 1 0 0
  [5,24,0.9239,0,0.3827,0.9239,1,0.3827,0.7071,0,0.7071,1,0,0],
// 4 16 0.7071 1 0.7071 0.3827 1 0.9239 0.3827 0 0.9239 0.7071 0 0.7071
  [4,16,0.7071,1,0.7071,0.3827,1,0.9239,0.3827,0,0.9239,0.7071,0,0.7071],
// 5 24 0.7071 0 0.7071 0.7071 1 0.7071 0.3827 0 0.9239 0.9239 0 0.3827
  [5,24,0.7071,0,0.7071,0.7071,1,0.7071,0.3827,0,0.9239,0.9239,0,0.3827],
// 4 16 0.3827 1 0.9239 0 1 1 0 0 1 0.3827 0 0.9239
  [4,16,0.3827,1,0.9239,0,1,1,0,0,1,0.3827,0,0.9239],
// 5 24 0.3827 0 0.9239 0.3827 1 0.9239 0 0 1 0.7071 0 0.7071
  [5,24,0.3827,0,0.9239,0.3827,1,0.9239,0,0,1,0.7071,0,0.7071],
// 5 24 0 0 1 0 1 1 0.3827 0 0.9239 -1 0 1
  [5,24,0,0,1,0,1,1,0.3827,0,0.9239,-1,0,1],
];
module ldraw_lib__1_4cyli(step=0, col=false, unit=2/5, alt=false, line=0.2, solid=!$preview)
    makepoly(ldraw_lib__1_4cyli(), step=step, col=col, unit=unit, alt=alt, line=line, solid=solid);
ldraw_lib__1_4cyli(line=0.2);
// file: ../p/1-4chrd.scad
use <../lib.scad>
$fa=1; $fs=0.2;
function ldraw_lib__1_4chrd(realsolid=false) = [
// 0 Chord 0.25
// 0 Name: 1-4chrd.dat
// 0 Author: Tony Hafner [hafhead]
// 0 !LDRAW_ORG Primitive UPDATE 2012-02
// 0 !LICENSE Licensed under CC BY 2.0 and CC BY 4.0 : see CAreadme.txt
// 
// 0 BFC CERTIFY CCW
  [0,"BFC","CERTIFY"],
  [0,"BFC","CCW"],
// 
// 0 !HISTORY 2004-04-22 [PTadmin] Official Update 2004-02
// 0 !HISTORY 2007-10-09 [PTadmin] Header formatted for Contributor Agreement
// 0 !HISTORY 2008-07-01 [PTadmin] Official Update 2008-01
// 0 !HISTORY 2012-08-02 [MMR1988] Re-creation with PrimGen2 and Rectifier
// 0 !HISTORY 2012-08-09 [PTadmin] Official Update 2012-02
// 
// 
// 4 16 0.9239 0 0.3827 0.3827 0 0.9239 0 0 1 1 0 0
  [4,16,0.9239,0,0.3827,0.3827,0,0.9239,0,0,1,1,0,0],
// 3 16 0.7071 0 0.7071 0.3827 0 0.9239 0.9239 0 0.3827
  [3,16,0.7071,0,0.7071,0.3827,0,0.9239,0.9239,0,0.3827],
];
module ldraw_lib__1_4chrd(step=0, col=false, unit=2/5, alt=false, line=0.2, solid=!$preview)
    makepoly(ldraw_lib__1_4chrd(solid), step=step, col=col, unit=unit, alt=alt, line=line, solid=solid);
ldraw_lib__1_4chrd(line=0.2);
// file: s/87079s01.scad
use <../../lib.scad>
use <../../p/box4.scad>
use <../../p/box5.scad>
use <../../p/stud4.scad>
function ldraw_lib__s__87079s01() = [
// 0 ~Tile  2 x  4 with Groove without Top
// 0 Name: s\87079s01.dat
// 0 Author: Philippe Hurbain [Philo]
// 0 !LDRAW_ORG Subpart UPDATE 2012-03
// 0 !LICENSE Licensed under CC BY 4.0 : see CAreadme.txt
// 
// 0 BFC CERTIFY CCW
  [0,"BFC","CERTIFY"],
  [0,"BFC","CCW"],
// 
// 0 !HISTORY 2012-09-30 [Philo] Subparted from Tim Gould's original design
// 0 !HISTORY 2012-12-28 [PTadmin] Official Update 2012-03
// 
// 
// 1 16 0 0 0 40 0 0 0 7 0 0 0 20 box4.dat
  [1,16,0,0,0,40,0,0,0,7,0,0,0,20, ldraw_lib__box4()],
// 1 16 0 7 0 39 0 0 0 1 0 0 0 19 box4.dat
  [1,16,0,7,0,39,0,0,0,1,0,0,0,19, ldraw_lib__box4()],
// 0 BFC INVERTNEXT
  [0,"BFC","INVERTNEXT"],
// 1 16 0 8 0 -36 0 0 0 -4 0 0 0 16 box5.dat
  [1,16,0,8,0,-36,0,0,0,-4,0,0,0,16, ldraw_lib__box5()],
// 4 16 -40 7 -20 -39 7 -19 39 7 -19 40 7 -20
  [4,16,-40,7,-20,-39,7,-19,39,7,-19,40,7,-20],
// 4 16 40 7 20 39 7 19 -39 7 19 -40 7 20
  [4,16,40,7,20,39,7,19,-39,7,19,-40,7,20],
// 4 16 -40 7 -20 -40 7 20 -39 7 19 -39 7 -19
  [4,16,-40,7,-20,-40,7,20,-39,7,19,-39,7,-19],
// 4 16 40 7 20 40 7 -20 39 7 -19 39 7 19
  [4,16,40,7,20,40,7,-20,39,7,-19,39,7,19],
// 4 16 -39 8 -19 -36 8 -16 36 8 -16 39 8 -19
  [4,16,-39,8,-19,-36,8,-16,36,8,-16,39,8,-19],
// 4 16 39 8 19 36 8 16 -36 8 16 -39 8 19
  [4,16,39,8,19,36,8,16,-36,8,16,-39,8,19],
// 4 16 -39 8 -19 -39 8 19 -36 8 16 -36 8 -16
  [4,16,-39,8,-19,-39,8,19,-36,8,16,-36,8,-16],
// 4 16 39 8 19 39 8 -19 36 8 -16 36 8 16
  [4,16,39,8,19,39,8,-19,36,8,-16,36,8,16],
// 1 16 0 4 0 1 0 0 0 -1 0 0 0 1 stud4.dat
  [1,16,0,4,0,1,0,0,0,-1,0,0,0,1, ldraw_lib__stud4()],
// 1 16 20 4 0 1 0 0 0 -1 0 0 0 1 stud4.dat
  [1,16,20,4,0,1,0,0,0,-1,0,0,0,1, ldraw_lib__stud4()],
// 1 16 -20 4 0 1 0 0 0 -1 0 0 0 1 stud4.dat
  [1,16,-20,4,0,1,0,0,0,-1,0,0,0,1, ldraw_lib__stud4()],
];
module ldraw_lib__s__87079s01(step=0, col=false, unit=2/5, alt=false, line=0.2, solid=!$preview)
    makepoly(ldraw_lib__s__87079s01(), step=step, col=col, unit=unit, alt=alt, line=line, solid=solid);
ldraw_lib__s__87079s01(line=0.2);
// file: 6347356m.scad
use <../lib.scad>
use <../p/1-4chrd.scad>
use <../p/1-4cyli.scad>
function ldraw_lib__6347356m() = [
// 0 Sticker  1.7 x  3.7 with Bright Light Orange Trapezoid Left
// 0 Name: 6347356m.dat
// 0 Author: Evert-Jan Boer [ejboer]
// 0 !LDRAW_ORG Part UPDATE 2024-06
// 0 !LICENSE Licensed under CC BY 4.0 : see CAreadme.txt
// 
// 0 BFC CERTIFY CCW
  [0,"BFC","CERTIFY"],
  [0,"BFC","CCW"],
// 
// 0 !KEYWORDS Republic Gunship, Set 75309, Star Wars
// 
// 0 !HISTORY 2024-07-29 [OrionP] Official Update 2024-06
// 
// 1 16 36.5 0 16.5 1 0 0 0 -1 0 0 0 1 1-4chrd.dat
  [1,16,36.5,0,16.5,1,0,0,0,-1,0,0,0,1, ldraw_lib__1_4chrd()],
// 1 16 36.5 0 -16.5 0 0 1 0 -1 0 -1 0 0 1-4chrd.dat
  [1,16,36.5,0,-16.5,0,0,1,0,-1,0,-1,0,0, ldraw_lib__1_4chrd()],
// 1 16 -36.5 0 -16.5 -1 0 0 0 -1 0 0 0 -1 1-4chrd.dat
  [1,16,-36.5,0,-16.5,-1,0,0,0,-1,0,0,0,-1, ldraw_lib__1_4chrd()],
// 1 16 -36.5 0 16.5 0 0 -1 0 -1 0 1 0 0 1-4chrd.dat
  [1,16,-36.5,0,16.5,0,0,-1,0,-1,0,1,0,0, ldraw_lib__1_4chrd()],
// 4 16 36.5 0 -17.5 -36.5 0 -17.5 -37.5 0 -16.5 37.5 0 -16.5
  [4,16,36.5,0,-17.5,-36.5,0,-17.5,-37.5,0,-16.5,37.5,0,-16.5],
// 4 16 37.5 0 16.5 37.5 0 -16.5 -37.5 0 -16.5 -37.5 0 16.5
  [4,16,37.5,0,16.5,37.5,0,-16.5,-37.5,0,-16.5,-37.5,0,16.5],
// 4 16 37.5 0 16.5 -37.5 0 16.5 -36.5 0 17.5 36.5 0 17.5
  [4,16,37.5,0,16.5,-37.5,0,16.5,-36.5,0,17.5,36.5,0,17.5],
// 
// 1 16 36.5 -.25 16.5 1 0 0 0 .25 0 0 0 1 1-4cyli.dat
  [1,16,36.5,-.25,16.5,1,0,0,0,.25,0,0,0,1, ldraw_lib__1_4cyli()],
// 1 16 -36.5 -.25 16.5 0 0 -1 0 .25 0 1 0 0 1-4cyli.dat
  [1,16,-36.5,-.25,16.5,0,0,-1,0,.25,0,1,0,0, ldraw_lib__1_4cyli()],
// 1 16 -36.5 -.25 -16.5 -1 0 0 0 .25 0 0 0 -1 1-4cyli.dat
  [1,16,-36.5,-.25,-16.5,-1,0,0,0,.25,0,0,0,-1, ldraw_lib__1_4cyli()],
// 1 16 36.5 -.25 -16.5 0 0 1 0 .25 0 -1 0 0 1-4cyli.dat
  [1,16,36.5,-.25,-16.5,0,0,1,0,.25,0,-1,0,0, ldraw_lib__1_4cyli()],
// 4 16 36.5 -.25 -17.5 -36.5 -.25 -17.5 -36.5 0 -17.5 36.5 0 -17.5
  [4,16,36.5,-.25,-17.5,-36.5,-.25,-17.5,-36.5,0,-17.5,36.5,0,-17.5],
// 4 16 37.5 -.25 16.5 37.5 -.25 -16.5 37.5 0 -16.5 37.5 0 16.5
  [4,16,37.5,-.25,16.5,37.5,-.25,-16.5,37.5,0,-16.5,37.5,0,16.5],
// 4 16 -36.5 -.25 17.5 36.5 -.25 17.5 36.5 0 17.5 -36.5 0 17.5
  [4,16,-36.5,-.25,17.5,36.5,-.25,17.5,36.5,0,17.5,-36.5,0,17.5],
// 4 16 -37.5 -.25 -16.5 -37.5 -.25 16.5 -37.5 0 16.5 -37.5 0 -16.5
  [4,16,-37.5,-.25,-16.5,-37.5,-.25,16.5,-37.5,0,16.5,-37.5,0,-16.5],
// 
// 1 16 -36.5 -.25 16.5 0 0 -1 0 1 0 1 0 0 1-4chrd.dat
  [1,16,-36.5,-.25,16.5,0,0,-1,0,1,0,1,0,0, ldraw_lib__1_4chrd()],
// 1 16 -36.5 -.25 -16.5 -1 0 0 0 1 0 0 0 -1 1-4chrd.dat
  [1,16,-36.5,-.25,-16.5,-1,0,0,0,1,0,0,0,-1, ldraw_lib__1_4chrd()],
// 1 16 36.5 -.25 -16.5 0 0 1 0 1 0 -1 0 0 1-4chrd.dat
  [1,16,36.5,-.25,-16.5,0,0,1,0,1,0,-1,0,0, ldraw_lib__1_4chrd()],
// 1 16 36.5 -.25 16.5 1 0 0 0 1 0 0 0 1 1-4chrd.dat
  [1,16,36.5,-.25,16.5,1,0,0,0,1,0,0,0,1, ldraw_lib__1_4chrd()],
// 4 16 -36.5 -.25 -17.5 -36.5 -.25 17.5 -37.5 -.25 16.5 -37.5 -.25 -16.5
  [4,16,-36.5,-.25,-17.5,-36.5,-.25,17.5,-37.5,-.25,16.5,-37.5,-.25,-16.5],
// 4 16 -16.6 -.25 -1.6 -36.5 -.25 17.5 -36.5 -.25 -17.5 -22.8 -.25 -10.5
  [4,16,-16.6,-.25,-1.6,-36.5,-.25,17.5,-36.5,-.25,-17.5,-22.8,-.25,-10.5],
// 3 16 36.5 -.25 17.5 37.5 -.25 -16.5 37.5 -.25 16.5
  [3,16,36.5,-.25,17.5,37.5,-.25,-16.5,37.5,-.25,16.5],
// 4 16 34.3 -.25 -10.5 36.5 -.25 -17.5 37.5 -.25 -16.5 36.5 -.25 17.5
  [4,16,34.3,-.25,-10.5,36.5,-.25,-17.5,37.5,-.25,-16.5,36.5,-.25,17.5],
// 3 16 36.5 -.25 17.5 26 -.25 11.7 34.3 -.25 -10.5
  [3,16,36.5,-.25,17.5,26,-.25,11.7,34.3,-.25,-10.5],
// 4 16 36.5 -.25 17.5 -36.5 -.25 17.5 -16.6 -.25 -1.6 26 -.25 11.7
  [4,16,36.5,-.25,17.5,-36.5,-.25,17.5,-16.6,-.25,-1.6,26,-.25,11.7],
// 4 16 -22.8 -.25 -10.5 -36.5 -.25 -17.5 36.5 -.25 -17.5 34.3 -.25 -10.5
  [4,16,-22.8,-.25,-10.5,-36.5,-.25,-17.5,36.5,-.25,-17.5,34.3,-.25,-10.5],
// 
// 0 BFC NOCLIP
  [0,"BFC","NOCLIP"],
// 4 191 26 -.25 11.7 -16.6 -.25 -1.6 -22.8 -.25 -10.5 34.3 -.25 -10.5
  [4,191,26,-.25,11.7,-16.6,-.25,-1.6,-22.8,-.25,-10.5,34.3,-.25,-10.5],
];
module ldraw_lib__6347356m(step=0, col=false, unit=2/5, alt=false, line=0.2, solid=!$preview)
    makepoly(ldraw_lib__6347356m(), step=step, col=col, unit=unit, alt=alt, line=line, solid=solid);
ldraw_lib__6347356m(line=0.2);
// file: 87079.scad
use <../lib.scad>
use <s/87079s01.scad>
function ldraw_lib__87079() = [
// 0 Tile  2 x  4 with Groove
// 0 Name: 87079.dat
// 0 Author: Tim Gould [timgould]
// 0 !LDRAW_ORG Part UPDATE 2012-03
// 0 !LICENSE Licensed under CC BY 4.0 : see CAreadme.txt
// 
// 0 BFC CERTIFY CCW
  [0,"BFC","CERTIFY"],
  [0,"BFC","CCW"],
// 
// 0 !HISTORY 2010-04-05 [PTadmin] Official Update 2010-01
// 0 !HISTORY 2012-09-30 [Philo] Subparted for patterns
// 0 !HISTORY 2012-12-28 [PTadmin] Official Update 2012-03
// 
// 
// 4 16 -40 0 -20 40 0 -20 40 0 20 -40 0 20
  [4,16,-40,0,-20,40,0,-20,40,0,20,-40,0,20],
// 1 16 0 0 0 1 0 0 0 1 0 0 0 1 s\87079s01.dat
  [1,16,0,0,0,1,0,0,0,1,0,0,0,1, ldraw_lib__s__87079s01()],
];
module ldraw_lib__87079(step=0, col=false, unit=2/5, alt=false, line=0.2, solid=!$preview)
    makepoly(ldraw_lib__87079(), step=step, col=col, unit=unit, alt=alt, line=line, solid=solid);
ldraw_lib__87079(line=0.2);
// file: 6347356o.scad
use <../lib.scad>
use <6347356m.scad>
function ldraw_lib__6347356o() = [
// 0 Sticker  1.7 x  3.7 with Bright Light Orange Trapezoid Right
// 0 Name: 6347356o.dat
// 0 Author: Evert-Jan Boer [ejboer]
// 0 !LDRAW_ORG Part UPDATE 2024-06
// 0 !LICENSE Licensed under CC BY 4.0 : see CAreadme.txt
// 
// 0 BFC CERTIFY CCW
  [0,"BFC","CERTIFY"],
  [0,"BFC","CCW"],
// 
// 0 !KEYWORDS Republic Gunship, Set 75309, Star Wars
// 
// 0 !HISTORY 2024-07-29 [OrionP] Official Update 2024-06
// 
// 1 16 0 0 0 -1 0 0 0 1 0 0 0 1 6347356m.dat
  [1,16,0,0,0,-1,0,0,0,1,0,0,0,1, ldraw_lib__6347356m()],
];
module ldraw_lib__6347356o(step=0, col=false, unit=2/5, alt=false, line=0.2, solid=!$preview)
    makepoly(ldraw_lib__6347356o(), step=step, col=col, unit=unit, alt=alt, line=line, solid=solid);
ldraw_lib__6347356o(line=0.2);
// main file
use <../lib.scad>
use <6347356o.scad>
use <87079.scad>
function ldraw_lib__87079d06() = [
// 0 Tile  2 x  4 with Bright Light Orange Trapezoid Right Sticker
// 0 Name: 87079d06.dat
// 0 Author: Evert-Jan Boer [ejboer]
// 0 !LDRAW_ORG Shortcut UPDATE 2024-07
// 0 !LICENSE Licensed under CC BY 4.0 : see CAreadme.txt
// 
// 0 BFC CERTIFY CCW
  [0,"BFC","CERTIFY"],
  [0,"BFC","CCW"],
// 
// 0 !CATEGORY Sticker Shortcut
// 0 !KEYWORDS Republic Gunship, Set 75309, Star Wars
// 
// 0 !HISTORY 2024-08-26 [OrionP] Official Update 2024-07
// 
// 1 16 0 0 0 1 0 0 0 1 0 0 0 1 87079.dat
  [1,16,0,0,0,1,0,0,0,1,0,0,0,1, ldraw_lib__87079()],
// 1 16 0 0 0 1 0 0 0 1 0 0 0 1 6347356o.dat
  [1,16,0,0,0,1,0,0,0,1,0,0,0,1, ldraw_lib__6347356o()],
];
module ldraw_lib__87079d06(step=0, col=false, unit=2/5, alt=false, line=0.2, solid=!$preview)
    makepoly(ldraw_lib__87079d06(), step=step, col=col, unit=unit, alt=alt, line=line, solid=solid);
ldraw_lib__87079d06(line=0.2);
